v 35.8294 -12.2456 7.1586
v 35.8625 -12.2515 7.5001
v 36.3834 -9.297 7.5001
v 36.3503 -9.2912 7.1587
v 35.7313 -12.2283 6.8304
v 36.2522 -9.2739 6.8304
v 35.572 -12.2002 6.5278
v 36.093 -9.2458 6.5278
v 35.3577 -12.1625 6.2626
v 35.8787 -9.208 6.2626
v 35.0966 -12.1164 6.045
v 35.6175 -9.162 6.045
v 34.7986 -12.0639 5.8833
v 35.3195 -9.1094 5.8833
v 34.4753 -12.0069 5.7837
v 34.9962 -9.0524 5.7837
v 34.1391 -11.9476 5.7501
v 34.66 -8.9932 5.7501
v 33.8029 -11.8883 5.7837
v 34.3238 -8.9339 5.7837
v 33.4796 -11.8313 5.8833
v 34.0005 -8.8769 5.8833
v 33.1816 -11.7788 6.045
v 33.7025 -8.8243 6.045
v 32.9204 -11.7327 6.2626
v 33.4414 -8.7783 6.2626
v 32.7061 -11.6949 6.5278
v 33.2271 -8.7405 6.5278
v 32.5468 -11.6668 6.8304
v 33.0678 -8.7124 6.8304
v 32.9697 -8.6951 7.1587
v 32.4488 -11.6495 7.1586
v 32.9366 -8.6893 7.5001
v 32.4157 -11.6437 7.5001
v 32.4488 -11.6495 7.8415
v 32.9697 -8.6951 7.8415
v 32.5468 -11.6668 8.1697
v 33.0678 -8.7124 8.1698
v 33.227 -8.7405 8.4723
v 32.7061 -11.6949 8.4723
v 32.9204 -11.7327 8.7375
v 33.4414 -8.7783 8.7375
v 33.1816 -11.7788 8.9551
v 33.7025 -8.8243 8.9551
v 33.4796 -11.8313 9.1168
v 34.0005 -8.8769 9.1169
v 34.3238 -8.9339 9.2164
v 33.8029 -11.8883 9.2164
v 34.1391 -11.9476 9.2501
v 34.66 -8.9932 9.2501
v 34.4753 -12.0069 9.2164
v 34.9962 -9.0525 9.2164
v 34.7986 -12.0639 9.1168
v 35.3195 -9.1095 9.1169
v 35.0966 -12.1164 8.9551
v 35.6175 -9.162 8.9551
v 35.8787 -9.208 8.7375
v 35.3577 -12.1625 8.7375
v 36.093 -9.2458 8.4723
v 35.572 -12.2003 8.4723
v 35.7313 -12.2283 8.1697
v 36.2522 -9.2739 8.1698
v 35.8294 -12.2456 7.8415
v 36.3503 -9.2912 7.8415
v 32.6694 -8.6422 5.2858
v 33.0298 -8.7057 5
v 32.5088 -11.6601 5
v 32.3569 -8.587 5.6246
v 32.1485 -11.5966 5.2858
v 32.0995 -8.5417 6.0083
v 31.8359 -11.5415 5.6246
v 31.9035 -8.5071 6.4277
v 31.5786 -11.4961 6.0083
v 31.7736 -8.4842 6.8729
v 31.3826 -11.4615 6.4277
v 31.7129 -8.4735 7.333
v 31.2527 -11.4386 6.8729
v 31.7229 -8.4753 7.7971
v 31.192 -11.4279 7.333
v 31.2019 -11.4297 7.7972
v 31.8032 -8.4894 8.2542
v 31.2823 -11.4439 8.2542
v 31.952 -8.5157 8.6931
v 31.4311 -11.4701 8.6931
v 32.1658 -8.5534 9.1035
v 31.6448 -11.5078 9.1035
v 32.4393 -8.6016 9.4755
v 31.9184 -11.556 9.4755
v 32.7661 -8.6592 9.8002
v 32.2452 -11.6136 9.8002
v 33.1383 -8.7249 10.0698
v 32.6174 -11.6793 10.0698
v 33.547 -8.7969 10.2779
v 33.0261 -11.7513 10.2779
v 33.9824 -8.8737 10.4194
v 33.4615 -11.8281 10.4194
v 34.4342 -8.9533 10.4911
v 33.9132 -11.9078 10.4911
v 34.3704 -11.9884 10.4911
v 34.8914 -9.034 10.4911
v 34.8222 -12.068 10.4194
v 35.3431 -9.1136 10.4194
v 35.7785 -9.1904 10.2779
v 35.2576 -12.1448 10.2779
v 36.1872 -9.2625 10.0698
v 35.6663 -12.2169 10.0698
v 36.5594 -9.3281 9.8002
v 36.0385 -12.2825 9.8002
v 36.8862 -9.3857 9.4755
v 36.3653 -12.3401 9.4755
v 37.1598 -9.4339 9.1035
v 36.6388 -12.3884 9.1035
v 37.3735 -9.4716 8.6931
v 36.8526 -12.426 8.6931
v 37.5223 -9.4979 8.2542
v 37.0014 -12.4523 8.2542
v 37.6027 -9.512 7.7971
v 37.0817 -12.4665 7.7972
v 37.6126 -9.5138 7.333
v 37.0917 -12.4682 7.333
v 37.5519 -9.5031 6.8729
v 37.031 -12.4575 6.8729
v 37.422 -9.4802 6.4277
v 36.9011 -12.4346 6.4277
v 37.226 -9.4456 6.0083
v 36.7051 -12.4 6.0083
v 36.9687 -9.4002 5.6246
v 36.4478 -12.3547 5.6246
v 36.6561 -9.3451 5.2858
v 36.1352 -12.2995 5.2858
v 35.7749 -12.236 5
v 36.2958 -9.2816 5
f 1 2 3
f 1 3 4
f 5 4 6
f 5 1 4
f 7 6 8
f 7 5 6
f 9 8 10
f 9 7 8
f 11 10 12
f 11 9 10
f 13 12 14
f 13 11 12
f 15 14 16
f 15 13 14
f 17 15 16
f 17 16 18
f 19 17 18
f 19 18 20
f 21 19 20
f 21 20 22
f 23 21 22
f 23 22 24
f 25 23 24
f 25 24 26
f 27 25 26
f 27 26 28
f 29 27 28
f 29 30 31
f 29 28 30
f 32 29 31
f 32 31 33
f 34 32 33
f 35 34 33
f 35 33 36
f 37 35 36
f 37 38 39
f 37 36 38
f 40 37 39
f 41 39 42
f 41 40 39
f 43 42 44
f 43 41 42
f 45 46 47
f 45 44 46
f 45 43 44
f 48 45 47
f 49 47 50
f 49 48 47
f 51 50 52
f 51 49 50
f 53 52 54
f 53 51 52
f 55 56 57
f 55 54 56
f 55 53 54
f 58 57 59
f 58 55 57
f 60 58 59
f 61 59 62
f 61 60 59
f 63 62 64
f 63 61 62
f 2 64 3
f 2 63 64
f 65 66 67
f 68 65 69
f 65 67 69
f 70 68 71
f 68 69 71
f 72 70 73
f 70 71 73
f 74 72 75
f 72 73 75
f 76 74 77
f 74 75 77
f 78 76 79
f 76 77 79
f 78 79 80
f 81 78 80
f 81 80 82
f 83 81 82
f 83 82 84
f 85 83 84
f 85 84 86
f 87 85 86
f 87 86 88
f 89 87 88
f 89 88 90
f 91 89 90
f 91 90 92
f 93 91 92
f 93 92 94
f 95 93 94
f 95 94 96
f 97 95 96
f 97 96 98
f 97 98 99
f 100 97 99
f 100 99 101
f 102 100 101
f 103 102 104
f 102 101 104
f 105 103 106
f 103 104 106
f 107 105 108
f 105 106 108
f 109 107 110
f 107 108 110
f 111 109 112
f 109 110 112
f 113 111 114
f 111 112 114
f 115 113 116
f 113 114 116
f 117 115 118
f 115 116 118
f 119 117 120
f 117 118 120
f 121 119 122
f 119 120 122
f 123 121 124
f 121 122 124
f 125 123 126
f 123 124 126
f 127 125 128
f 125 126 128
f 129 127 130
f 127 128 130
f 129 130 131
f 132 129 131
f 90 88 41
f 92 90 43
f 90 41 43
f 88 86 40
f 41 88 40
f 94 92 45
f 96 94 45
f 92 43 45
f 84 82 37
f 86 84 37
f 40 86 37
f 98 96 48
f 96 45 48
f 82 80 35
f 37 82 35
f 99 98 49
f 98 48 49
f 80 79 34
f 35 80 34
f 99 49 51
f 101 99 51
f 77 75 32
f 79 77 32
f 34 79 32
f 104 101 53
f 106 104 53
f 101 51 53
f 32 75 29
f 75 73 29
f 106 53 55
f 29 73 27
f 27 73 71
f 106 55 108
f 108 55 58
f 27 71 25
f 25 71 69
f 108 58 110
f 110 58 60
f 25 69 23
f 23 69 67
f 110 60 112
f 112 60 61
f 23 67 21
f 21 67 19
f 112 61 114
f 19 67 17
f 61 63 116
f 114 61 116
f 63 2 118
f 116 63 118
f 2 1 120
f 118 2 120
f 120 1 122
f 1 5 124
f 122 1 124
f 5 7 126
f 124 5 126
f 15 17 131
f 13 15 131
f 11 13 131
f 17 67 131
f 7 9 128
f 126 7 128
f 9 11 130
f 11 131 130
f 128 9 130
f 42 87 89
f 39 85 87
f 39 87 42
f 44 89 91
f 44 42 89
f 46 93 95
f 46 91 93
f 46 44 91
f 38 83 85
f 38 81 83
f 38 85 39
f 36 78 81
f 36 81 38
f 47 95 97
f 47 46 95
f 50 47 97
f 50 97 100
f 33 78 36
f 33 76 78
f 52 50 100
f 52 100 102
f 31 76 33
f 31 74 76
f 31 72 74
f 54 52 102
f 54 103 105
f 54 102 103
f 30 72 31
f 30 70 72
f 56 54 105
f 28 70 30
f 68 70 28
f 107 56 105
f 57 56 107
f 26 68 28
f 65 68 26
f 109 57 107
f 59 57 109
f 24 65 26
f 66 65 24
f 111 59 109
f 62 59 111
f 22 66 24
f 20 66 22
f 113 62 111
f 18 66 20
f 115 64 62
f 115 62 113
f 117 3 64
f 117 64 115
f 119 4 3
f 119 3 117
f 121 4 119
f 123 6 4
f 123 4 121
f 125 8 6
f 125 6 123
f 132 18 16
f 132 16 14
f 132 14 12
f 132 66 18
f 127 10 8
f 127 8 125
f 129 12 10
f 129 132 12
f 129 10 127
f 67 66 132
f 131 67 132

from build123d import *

# Parameters (mm, degrees)
PAD012_DEPTH                = 3
CYLINDER047_R               = 1.75
CYLINDER047_DEPTH           = 18
CYLINDER047_ROLL_ANGLE      = -89.999776
CYLINDER047_PITCH_ANGLE     = 1.4e-05
CYLINDER047_PLACEMENT_ANGLE = -9.999925
CYLINDER042_R               = 3
CYLINDER042_DEPTH           = 3
CYLINDER042_ROLL_ANGLE      = -89.999776
CYLINDER042_PITCH_ANGLE     = 1.4e-05
CYLINDER042_PLACEMENT_ANGLE = -9.999925


with BuildPart() as steg_u001:
    # Sketch012 → Pad012 (new body)
    with BuildSketch(Plane.XY):
        with BuildLine():
            add(Edge.make_bspline(
                [(44.997663, -28.408983), (45.245046, -6.764399), (28.5, -0.316434)],
                knots=[1.556693, 1.556693, 1.556693, 2.83913, 2.83913, 2.83913], degree=2, weights=[1, 0.801368, 1]))
            Line((28.5, -0.316434), (28.5, -25.5))
            Line((28.5, -25.5), (44.997663, -28.408983))
        make_face()
    extrude(amount=PAD012_DEPTH)


with BuildPart() as steg_u001_1:
    # Body014 placement: moved
    add(steg_u001.part.moved(Location((0, 0, 2))))


with BuildPart() as cylinder047:
    # Cylinder047 → Cylinder047 (new body)
    with BuildSketch(Plane.XY):
        Circle(CYLINDER047_R)
    extrude(amount=CYLINDER047_DEPTH)


with BuildPart() as cylinder047_1:
    # Cylinder047 roll: moved
    add(cylinder047.part.rotate(Axis((0, 0, 0), (1, 0, 0)), CYLINDER047_ROLL_ANGLE))


with BuildPart() as cylinder047_2:
    # Cylinder047 pitch: moved
    add(cylinder047_1.part.rotate(Axis((0, 0, 0), (0, 1, 0)), CYLINDER047_PITCH_ANGLE))


with BuildPart() as cylinder047_3:
    # Cylinder047 placement: moved
    add(cylinder047_2.part.moved(Location((32.055183, -23.766017, 7.500006))).rotate(Axis((32.055183, -23.766017, 7.500006), (0, 0, 1)), CYLINDER047_PLACEMENT_ANGLE))


with BuildPart() as cut058:
    # Cylinder042 → Cylinder042 (new body)
    with BuildSketch(Plane.XY):
        Circle(CYLINDER042_R)
    extrude(amount=CYLINDER042_DEPTH)


with BuildPart() as cut058_1:
    # Cylinder042 roll: moved
    add(cut058.part.rotate(Axis((0, 0, 0), (1, 0, 0)), CYLINDER042_ROLL_ANGLE))


with BuildPart() as cut058_2:
    # Cylinder042 pitch: moved
    add(cut058_1.part.rotate(Axis((0, 0, 0), (0, 1, 0)), CYLINDER042_PITCH_ANGLE))


with BuildPart() as cut058_3:
    # Cylinder042 placement: moved
    add(cut058_2.part.moved(Location((34.141828, -11.94807, 7.500056))).rotate(Axis((34.141828, -11.94807, 7.500056), (0, 0, 1)), CYLINDER042_PLACEMENT_ANGLE))

    # Cut038: cut Cylinder047
    add(cylinder047_3.part, mode=Mode.SUBTRACT)

    # Cut058: cut steg_U001
    add(steg_u001_1.part, mode=Mode.SUBTRACT)


solid = cut058_3.part
